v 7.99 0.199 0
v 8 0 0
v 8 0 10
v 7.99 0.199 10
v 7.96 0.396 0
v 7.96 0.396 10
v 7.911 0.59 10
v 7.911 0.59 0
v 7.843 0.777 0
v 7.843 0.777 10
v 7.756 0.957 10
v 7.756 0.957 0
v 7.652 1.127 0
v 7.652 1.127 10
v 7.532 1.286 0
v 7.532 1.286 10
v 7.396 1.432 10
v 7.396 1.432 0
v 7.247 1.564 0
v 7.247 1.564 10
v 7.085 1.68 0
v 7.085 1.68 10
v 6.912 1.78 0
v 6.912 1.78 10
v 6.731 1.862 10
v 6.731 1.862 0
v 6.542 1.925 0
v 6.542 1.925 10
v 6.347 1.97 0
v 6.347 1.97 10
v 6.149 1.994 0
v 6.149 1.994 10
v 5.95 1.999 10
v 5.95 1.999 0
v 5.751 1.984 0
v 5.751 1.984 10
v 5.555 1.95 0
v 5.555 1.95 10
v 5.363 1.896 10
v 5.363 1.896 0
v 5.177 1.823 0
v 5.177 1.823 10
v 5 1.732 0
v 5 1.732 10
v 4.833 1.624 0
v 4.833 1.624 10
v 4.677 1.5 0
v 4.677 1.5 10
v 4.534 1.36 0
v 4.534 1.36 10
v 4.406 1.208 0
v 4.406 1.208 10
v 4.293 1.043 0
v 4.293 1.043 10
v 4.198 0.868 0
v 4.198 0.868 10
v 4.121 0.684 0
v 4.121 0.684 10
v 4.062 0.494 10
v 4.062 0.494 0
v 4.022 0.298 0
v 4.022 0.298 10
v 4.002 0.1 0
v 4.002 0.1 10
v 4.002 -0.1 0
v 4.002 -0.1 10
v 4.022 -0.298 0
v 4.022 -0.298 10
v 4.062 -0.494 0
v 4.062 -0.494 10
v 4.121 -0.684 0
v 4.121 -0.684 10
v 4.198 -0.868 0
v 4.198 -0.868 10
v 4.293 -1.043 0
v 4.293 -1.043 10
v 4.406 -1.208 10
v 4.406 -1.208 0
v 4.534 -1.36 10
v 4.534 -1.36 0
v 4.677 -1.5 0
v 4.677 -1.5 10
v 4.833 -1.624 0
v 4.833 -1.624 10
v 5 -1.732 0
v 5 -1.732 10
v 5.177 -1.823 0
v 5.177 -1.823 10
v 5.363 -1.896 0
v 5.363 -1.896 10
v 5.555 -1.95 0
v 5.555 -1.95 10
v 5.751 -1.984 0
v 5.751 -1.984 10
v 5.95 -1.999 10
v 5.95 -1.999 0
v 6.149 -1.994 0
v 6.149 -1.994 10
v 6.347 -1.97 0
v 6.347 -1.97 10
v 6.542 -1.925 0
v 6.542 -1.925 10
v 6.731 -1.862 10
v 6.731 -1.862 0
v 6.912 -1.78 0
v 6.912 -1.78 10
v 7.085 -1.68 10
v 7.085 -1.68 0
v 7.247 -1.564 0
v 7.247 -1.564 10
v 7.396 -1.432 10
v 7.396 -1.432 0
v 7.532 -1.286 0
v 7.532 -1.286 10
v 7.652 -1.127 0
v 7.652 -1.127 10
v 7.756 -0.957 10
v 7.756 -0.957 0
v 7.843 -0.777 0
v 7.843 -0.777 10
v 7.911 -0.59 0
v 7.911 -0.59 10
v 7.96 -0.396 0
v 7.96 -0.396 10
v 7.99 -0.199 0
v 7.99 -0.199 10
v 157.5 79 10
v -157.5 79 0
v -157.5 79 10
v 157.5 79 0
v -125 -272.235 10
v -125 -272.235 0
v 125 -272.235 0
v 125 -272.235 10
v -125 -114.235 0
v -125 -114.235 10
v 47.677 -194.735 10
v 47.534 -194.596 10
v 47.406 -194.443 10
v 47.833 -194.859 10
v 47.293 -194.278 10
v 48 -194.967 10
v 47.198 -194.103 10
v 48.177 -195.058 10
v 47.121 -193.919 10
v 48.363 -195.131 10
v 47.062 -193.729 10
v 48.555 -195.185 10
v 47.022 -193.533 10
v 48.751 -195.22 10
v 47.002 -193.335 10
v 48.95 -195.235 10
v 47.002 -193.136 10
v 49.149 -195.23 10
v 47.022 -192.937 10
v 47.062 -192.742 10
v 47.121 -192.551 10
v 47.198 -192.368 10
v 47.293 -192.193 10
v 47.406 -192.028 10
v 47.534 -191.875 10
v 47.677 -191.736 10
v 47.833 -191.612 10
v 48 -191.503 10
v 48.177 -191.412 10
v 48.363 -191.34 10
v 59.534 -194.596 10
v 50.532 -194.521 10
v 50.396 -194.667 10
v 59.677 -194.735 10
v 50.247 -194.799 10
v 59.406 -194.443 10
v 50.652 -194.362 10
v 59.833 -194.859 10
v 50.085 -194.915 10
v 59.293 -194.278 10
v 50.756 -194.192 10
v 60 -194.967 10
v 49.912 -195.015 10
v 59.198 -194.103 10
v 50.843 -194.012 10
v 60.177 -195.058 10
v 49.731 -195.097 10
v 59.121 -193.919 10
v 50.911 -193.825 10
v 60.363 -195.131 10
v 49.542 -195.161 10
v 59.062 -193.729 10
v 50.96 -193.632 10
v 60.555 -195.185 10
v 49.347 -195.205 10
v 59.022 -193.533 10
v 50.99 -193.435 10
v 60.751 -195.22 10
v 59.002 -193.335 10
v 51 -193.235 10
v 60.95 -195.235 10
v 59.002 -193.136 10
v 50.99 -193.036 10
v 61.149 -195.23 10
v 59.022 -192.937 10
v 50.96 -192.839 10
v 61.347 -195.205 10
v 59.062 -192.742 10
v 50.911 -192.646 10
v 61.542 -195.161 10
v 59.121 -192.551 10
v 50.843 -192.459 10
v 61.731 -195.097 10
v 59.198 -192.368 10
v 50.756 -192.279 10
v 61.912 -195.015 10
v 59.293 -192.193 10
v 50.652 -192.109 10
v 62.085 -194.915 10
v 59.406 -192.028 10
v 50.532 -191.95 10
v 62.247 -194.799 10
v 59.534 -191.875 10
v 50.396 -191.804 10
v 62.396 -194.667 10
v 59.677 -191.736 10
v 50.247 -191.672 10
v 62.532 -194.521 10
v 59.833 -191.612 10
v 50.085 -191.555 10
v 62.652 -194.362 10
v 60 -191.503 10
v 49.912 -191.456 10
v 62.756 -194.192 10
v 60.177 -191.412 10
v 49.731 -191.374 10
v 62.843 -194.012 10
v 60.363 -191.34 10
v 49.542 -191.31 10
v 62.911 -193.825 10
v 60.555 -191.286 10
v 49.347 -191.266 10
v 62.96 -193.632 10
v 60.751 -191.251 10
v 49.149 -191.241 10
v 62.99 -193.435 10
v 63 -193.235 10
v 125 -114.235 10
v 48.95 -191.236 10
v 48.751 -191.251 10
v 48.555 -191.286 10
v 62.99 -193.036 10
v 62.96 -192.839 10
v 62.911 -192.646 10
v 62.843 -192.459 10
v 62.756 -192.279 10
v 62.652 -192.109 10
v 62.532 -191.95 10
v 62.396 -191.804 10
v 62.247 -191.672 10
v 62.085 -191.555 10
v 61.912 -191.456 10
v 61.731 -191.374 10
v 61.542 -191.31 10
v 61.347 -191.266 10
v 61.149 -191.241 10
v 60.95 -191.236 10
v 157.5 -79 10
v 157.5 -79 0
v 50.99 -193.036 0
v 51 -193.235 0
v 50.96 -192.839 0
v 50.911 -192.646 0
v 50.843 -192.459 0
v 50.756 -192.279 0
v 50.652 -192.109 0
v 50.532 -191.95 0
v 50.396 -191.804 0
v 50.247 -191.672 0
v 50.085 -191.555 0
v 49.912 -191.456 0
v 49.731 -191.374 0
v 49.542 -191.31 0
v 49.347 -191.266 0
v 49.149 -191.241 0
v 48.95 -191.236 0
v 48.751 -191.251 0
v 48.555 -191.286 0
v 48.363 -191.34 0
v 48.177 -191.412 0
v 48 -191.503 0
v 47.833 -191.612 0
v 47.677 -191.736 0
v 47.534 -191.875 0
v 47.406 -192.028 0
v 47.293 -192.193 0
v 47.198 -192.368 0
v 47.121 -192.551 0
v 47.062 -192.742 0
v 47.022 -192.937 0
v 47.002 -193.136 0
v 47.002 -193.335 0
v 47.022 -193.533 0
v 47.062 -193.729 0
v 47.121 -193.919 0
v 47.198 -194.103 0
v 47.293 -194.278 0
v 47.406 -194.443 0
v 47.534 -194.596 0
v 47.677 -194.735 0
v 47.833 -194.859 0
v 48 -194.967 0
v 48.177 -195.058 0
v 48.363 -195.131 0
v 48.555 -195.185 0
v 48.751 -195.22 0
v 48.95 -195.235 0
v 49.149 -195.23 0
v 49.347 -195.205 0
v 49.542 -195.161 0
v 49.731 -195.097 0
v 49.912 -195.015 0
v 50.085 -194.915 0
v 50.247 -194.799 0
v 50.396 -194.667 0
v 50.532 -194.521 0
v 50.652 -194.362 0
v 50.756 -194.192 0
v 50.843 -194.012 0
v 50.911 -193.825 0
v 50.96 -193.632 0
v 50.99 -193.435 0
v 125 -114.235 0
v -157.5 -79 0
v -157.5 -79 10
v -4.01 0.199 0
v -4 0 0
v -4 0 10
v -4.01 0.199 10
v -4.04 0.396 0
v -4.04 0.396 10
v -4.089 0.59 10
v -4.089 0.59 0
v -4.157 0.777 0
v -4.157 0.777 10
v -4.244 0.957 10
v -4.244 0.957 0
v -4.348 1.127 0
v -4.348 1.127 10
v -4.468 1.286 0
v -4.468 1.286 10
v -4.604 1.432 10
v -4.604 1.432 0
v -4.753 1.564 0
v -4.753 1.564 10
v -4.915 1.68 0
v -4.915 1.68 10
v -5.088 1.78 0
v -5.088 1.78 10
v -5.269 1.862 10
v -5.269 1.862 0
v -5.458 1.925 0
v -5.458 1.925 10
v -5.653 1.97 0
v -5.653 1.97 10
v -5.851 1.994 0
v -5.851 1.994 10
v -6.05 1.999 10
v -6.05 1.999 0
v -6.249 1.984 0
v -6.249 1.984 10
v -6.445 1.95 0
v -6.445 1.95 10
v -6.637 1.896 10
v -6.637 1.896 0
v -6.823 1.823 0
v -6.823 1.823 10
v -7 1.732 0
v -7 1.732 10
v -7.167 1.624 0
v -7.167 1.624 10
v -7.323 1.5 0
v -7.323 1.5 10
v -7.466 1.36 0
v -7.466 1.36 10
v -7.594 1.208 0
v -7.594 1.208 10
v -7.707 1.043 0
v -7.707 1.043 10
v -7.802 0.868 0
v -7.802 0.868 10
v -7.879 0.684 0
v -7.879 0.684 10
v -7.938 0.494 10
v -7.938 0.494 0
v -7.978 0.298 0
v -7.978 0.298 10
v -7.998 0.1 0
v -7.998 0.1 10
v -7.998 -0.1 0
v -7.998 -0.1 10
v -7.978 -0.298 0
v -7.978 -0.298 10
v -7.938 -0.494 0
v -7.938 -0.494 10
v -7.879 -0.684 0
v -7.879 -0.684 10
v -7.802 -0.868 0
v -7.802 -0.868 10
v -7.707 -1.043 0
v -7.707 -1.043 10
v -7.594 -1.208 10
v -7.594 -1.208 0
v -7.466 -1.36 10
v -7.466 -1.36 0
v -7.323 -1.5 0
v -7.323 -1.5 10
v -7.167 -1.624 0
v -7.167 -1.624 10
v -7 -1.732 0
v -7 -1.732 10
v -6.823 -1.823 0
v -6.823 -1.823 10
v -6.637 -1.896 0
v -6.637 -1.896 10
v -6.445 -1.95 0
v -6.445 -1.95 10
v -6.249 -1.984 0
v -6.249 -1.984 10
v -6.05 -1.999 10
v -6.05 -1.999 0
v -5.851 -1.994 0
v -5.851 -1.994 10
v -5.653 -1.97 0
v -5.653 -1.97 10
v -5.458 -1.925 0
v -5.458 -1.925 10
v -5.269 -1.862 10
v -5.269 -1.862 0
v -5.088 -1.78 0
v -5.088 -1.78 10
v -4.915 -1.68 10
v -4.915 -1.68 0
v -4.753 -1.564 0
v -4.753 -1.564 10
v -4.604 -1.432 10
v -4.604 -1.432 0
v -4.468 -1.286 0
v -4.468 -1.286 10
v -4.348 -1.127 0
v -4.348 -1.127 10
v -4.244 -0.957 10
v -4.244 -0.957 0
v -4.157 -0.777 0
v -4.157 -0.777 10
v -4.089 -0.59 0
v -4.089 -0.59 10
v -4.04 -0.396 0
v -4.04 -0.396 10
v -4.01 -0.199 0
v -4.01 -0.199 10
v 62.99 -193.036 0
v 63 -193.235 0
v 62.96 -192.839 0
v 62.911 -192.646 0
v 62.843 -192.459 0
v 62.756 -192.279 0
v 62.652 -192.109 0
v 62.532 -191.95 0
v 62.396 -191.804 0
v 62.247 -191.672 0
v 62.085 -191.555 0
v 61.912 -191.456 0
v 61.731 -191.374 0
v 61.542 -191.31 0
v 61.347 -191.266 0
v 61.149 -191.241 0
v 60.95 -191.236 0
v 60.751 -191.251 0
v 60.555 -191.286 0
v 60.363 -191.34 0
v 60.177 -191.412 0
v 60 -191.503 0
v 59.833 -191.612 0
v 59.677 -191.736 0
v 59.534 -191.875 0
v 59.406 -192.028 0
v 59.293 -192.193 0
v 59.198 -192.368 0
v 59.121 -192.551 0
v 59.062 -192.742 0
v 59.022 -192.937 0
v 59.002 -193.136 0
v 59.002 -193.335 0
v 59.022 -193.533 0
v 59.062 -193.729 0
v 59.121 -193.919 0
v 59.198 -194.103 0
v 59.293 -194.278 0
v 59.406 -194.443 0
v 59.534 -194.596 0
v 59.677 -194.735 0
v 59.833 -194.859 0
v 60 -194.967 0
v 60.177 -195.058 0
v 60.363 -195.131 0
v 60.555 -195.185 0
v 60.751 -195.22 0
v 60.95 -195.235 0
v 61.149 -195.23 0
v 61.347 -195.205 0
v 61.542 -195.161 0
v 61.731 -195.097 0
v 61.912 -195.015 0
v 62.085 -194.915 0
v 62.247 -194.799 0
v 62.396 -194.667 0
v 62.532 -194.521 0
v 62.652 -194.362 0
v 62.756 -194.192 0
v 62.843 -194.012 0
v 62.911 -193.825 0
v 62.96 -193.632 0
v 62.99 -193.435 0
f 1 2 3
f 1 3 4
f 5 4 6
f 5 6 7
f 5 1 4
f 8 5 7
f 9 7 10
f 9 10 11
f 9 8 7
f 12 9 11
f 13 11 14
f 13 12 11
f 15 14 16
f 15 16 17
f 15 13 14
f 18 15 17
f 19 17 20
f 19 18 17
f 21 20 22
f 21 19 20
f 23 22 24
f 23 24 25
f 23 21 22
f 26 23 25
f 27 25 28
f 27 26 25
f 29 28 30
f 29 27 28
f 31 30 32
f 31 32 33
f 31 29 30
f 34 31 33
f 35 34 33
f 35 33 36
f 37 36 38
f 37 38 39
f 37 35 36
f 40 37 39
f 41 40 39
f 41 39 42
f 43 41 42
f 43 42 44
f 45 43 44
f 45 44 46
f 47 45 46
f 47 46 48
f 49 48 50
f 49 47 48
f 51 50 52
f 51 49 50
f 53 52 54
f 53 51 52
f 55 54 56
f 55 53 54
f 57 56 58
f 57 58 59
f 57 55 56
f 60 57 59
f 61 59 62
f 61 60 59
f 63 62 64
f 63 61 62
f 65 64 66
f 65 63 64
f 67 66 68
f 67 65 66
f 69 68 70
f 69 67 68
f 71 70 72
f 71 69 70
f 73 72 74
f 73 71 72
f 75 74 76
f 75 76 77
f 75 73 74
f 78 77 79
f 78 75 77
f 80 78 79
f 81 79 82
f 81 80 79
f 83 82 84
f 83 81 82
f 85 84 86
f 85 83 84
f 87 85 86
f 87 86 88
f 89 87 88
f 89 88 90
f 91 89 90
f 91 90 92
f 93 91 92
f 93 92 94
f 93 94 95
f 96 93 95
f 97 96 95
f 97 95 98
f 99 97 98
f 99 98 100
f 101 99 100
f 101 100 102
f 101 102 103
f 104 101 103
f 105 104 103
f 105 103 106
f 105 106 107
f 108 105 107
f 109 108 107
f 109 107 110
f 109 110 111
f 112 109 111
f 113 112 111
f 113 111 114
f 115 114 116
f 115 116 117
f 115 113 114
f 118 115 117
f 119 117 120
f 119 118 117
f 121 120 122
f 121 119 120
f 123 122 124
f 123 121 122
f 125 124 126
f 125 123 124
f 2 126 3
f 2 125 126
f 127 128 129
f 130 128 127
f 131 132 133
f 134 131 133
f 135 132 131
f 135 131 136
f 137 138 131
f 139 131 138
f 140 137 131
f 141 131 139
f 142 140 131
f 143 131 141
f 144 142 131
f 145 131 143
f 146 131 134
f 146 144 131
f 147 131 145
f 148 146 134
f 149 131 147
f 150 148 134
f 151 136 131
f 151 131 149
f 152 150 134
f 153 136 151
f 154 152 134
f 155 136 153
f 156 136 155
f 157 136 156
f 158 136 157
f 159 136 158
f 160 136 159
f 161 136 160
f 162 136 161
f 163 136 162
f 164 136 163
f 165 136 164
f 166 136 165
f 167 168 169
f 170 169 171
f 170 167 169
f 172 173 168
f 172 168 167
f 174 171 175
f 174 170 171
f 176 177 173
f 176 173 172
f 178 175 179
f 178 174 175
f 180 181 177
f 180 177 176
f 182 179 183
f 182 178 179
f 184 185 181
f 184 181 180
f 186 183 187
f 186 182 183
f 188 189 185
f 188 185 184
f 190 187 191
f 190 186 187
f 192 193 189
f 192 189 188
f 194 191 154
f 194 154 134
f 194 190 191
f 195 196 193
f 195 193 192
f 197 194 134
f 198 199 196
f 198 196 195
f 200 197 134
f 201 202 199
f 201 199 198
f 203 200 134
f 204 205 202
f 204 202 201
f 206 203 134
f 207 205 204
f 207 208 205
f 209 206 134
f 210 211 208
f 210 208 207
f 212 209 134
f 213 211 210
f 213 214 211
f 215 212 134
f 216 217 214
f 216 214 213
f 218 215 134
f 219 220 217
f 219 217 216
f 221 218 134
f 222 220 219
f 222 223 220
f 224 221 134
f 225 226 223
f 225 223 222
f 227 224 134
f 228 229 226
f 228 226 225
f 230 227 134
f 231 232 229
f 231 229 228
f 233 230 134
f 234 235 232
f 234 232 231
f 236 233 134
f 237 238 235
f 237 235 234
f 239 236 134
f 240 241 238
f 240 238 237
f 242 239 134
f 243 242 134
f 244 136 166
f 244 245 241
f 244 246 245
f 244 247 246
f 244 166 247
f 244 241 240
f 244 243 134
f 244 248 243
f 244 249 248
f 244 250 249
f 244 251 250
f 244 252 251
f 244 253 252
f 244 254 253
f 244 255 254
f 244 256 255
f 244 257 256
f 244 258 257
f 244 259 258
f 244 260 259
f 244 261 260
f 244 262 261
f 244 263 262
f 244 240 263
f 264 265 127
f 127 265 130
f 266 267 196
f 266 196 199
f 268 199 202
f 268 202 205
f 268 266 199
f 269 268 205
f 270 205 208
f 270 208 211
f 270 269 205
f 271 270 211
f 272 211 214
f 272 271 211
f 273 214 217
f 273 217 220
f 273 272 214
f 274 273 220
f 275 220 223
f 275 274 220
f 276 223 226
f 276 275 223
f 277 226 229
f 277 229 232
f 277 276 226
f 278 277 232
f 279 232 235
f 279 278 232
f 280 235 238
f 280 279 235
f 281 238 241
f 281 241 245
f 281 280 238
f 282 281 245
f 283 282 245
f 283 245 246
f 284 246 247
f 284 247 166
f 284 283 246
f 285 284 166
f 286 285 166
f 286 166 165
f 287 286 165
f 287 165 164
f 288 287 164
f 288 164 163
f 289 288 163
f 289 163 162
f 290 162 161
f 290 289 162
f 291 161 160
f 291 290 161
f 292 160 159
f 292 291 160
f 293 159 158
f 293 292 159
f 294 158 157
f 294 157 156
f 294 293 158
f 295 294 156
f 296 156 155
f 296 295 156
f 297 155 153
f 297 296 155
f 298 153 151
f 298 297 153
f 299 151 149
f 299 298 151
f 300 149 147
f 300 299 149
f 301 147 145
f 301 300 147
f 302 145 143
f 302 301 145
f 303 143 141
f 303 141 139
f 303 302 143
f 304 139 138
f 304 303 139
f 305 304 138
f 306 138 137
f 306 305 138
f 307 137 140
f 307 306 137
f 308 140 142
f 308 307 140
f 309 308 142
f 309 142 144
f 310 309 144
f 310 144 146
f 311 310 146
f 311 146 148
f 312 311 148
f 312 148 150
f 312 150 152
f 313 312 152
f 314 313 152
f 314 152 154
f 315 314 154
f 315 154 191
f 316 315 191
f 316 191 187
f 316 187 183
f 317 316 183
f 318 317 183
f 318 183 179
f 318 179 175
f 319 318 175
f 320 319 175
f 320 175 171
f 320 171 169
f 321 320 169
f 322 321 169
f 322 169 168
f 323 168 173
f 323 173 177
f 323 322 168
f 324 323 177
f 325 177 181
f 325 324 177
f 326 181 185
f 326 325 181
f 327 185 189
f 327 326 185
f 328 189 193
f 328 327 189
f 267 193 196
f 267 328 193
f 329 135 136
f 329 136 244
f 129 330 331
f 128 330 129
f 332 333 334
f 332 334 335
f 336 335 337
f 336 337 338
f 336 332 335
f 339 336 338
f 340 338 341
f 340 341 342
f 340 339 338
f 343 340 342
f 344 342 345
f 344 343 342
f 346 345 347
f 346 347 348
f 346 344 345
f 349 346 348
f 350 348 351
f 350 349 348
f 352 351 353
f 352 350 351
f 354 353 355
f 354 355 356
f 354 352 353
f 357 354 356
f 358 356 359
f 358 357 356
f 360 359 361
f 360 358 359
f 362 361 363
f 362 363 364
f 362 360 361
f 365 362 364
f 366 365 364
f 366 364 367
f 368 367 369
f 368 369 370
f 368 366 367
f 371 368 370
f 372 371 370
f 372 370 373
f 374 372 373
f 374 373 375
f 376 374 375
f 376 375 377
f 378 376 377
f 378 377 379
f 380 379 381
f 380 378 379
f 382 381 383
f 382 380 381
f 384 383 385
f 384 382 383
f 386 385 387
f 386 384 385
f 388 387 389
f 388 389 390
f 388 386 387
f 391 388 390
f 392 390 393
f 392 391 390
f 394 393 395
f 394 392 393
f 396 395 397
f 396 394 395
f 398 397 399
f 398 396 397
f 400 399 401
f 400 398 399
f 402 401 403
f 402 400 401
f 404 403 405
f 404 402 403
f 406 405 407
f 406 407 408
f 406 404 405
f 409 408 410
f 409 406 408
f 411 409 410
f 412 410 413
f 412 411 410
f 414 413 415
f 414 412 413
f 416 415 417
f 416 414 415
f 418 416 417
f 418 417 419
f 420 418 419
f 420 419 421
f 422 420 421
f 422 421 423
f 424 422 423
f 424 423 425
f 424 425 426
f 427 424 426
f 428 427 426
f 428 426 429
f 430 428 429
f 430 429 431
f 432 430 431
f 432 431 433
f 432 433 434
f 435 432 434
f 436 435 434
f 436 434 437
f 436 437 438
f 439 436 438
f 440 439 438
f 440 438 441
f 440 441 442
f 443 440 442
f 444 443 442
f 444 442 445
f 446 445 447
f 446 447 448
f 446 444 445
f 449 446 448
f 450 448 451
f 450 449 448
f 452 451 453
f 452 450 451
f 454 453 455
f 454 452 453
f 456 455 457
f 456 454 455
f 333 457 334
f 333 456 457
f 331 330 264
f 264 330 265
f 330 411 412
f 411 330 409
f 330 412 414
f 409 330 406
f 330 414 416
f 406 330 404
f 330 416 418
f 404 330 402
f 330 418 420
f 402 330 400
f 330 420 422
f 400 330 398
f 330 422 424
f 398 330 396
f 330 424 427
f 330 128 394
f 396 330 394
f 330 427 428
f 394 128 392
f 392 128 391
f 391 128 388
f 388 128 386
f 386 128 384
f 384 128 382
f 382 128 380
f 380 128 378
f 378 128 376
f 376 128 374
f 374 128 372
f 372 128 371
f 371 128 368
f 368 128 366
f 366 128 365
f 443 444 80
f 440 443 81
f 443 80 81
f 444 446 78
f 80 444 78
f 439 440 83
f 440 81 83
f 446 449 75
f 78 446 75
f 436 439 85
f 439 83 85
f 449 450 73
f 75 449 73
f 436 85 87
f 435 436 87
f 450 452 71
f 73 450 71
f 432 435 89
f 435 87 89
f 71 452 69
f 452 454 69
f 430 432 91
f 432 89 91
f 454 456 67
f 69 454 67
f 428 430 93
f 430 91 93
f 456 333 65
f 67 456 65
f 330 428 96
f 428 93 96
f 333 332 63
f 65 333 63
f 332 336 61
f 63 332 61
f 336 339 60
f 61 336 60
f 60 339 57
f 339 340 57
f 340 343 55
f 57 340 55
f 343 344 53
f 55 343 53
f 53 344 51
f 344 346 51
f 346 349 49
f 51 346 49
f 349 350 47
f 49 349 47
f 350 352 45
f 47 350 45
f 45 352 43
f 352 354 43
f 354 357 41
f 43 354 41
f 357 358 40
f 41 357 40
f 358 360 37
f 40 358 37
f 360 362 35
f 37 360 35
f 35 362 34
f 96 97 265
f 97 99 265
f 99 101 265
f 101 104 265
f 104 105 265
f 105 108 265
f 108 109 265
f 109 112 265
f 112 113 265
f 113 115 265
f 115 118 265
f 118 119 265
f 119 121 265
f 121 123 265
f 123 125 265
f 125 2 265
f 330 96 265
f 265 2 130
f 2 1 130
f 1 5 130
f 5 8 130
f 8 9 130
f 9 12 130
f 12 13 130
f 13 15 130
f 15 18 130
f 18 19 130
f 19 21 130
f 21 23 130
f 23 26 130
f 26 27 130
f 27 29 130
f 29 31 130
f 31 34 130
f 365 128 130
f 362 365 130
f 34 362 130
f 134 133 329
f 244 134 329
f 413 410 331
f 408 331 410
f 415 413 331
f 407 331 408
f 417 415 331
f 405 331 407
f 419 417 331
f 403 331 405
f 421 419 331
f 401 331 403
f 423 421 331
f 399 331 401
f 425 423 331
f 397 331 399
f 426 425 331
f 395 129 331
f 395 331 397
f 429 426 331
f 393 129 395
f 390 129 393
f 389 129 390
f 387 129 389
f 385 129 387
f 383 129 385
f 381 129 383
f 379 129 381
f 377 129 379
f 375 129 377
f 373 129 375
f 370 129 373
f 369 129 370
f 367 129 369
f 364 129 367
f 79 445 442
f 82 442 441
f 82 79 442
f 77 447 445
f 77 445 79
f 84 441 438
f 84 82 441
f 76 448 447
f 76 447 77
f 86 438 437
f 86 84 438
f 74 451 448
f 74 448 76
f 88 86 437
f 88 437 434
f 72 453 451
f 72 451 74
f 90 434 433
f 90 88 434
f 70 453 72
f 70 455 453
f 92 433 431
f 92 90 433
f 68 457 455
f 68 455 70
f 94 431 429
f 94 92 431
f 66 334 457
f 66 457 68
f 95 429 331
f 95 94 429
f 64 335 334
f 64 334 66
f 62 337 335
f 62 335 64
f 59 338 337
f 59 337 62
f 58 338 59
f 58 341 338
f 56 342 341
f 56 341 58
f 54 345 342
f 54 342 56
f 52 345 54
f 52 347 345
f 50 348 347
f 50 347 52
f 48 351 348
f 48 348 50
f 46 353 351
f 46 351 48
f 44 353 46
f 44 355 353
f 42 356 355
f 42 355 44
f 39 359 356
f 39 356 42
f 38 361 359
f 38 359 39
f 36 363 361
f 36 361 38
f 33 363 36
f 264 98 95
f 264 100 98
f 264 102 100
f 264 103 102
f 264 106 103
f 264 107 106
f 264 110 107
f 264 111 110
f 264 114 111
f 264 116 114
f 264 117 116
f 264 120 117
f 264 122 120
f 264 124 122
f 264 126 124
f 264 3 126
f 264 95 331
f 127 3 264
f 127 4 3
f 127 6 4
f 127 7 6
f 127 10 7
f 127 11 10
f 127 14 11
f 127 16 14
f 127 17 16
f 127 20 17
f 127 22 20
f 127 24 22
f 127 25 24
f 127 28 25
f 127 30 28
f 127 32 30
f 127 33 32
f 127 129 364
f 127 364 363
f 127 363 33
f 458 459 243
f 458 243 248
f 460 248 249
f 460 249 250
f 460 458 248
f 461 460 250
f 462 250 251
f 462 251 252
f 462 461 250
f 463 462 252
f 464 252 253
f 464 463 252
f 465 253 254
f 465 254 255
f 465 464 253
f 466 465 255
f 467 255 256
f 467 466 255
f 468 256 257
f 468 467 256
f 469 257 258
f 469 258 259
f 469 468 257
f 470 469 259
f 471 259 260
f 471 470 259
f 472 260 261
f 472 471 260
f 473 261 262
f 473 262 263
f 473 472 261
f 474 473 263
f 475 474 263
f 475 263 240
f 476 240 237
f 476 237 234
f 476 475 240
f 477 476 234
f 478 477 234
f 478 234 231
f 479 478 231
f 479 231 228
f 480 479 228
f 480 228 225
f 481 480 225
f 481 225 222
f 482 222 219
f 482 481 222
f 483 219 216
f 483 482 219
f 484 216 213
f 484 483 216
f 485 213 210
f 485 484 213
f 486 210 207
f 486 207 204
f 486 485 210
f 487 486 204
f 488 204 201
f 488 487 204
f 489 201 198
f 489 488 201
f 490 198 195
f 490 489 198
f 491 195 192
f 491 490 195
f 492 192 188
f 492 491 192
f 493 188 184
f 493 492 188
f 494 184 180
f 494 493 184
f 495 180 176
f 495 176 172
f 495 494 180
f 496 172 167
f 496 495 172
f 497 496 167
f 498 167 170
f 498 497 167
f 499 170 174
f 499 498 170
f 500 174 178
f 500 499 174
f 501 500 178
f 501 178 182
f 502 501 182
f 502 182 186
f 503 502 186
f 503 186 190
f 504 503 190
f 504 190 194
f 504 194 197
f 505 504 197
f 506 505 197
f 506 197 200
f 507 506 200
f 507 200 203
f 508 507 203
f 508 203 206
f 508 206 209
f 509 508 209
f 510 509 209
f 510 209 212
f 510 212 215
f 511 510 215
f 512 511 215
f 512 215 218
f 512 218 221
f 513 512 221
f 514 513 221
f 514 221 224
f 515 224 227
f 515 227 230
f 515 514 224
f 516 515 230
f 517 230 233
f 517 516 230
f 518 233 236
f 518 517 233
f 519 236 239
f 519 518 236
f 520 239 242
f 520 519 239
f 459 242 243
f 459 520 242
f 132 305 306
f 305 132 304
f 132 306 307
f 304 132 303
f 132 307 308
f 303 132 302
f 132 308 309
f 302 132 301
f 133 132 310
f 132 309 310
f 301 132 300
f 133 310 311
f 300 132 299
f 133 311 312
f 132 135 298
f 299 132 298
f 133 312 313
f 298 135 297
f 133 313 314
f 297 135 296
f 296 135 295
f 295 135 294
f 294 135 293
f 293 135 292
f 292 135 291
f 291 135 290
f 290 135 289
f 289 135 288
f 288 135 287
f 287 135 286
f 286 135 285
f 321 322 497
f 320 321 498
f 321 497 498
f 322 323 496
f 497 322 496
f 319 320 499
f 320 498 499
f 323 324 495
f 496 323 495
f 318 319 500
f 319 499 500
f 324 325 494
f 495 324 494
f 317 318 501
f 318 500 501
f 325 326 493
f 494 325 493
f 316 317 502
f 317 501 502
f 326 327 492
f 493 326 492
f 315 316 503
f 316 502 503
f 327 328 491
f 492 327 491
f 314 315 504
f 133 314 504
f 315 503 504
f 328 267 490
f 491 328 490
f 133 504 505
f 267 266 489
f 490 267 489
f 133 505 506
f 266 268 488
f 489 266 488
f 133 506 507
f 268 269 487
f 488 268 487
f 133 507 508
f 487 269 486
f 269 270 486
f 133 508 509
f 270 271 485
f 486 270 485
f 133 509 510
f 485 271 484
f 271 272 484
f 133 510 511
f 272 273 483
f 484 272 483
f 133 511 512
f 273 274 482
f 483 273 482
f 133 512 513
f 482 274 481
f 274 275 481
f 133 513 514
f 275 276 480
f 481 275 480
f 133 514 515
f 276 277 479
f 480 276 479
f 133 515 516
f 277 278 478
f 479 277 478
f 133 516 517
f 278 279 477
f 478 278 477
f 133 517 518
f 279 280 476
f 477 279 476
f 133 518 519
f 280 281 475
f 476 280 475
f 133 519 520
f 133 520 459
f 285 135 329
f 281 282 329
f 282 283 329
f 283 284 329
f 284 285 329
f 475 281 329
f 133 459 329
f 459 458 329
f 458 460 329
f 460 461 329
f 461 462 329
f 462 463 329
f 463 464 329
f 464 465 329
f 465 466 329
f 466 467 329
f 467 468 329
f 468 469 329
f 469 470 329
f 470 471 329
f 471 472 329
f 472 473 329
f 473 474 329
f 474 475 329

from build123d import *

# Parameters (mm, degrees)
F0_W     = 315
F0_H     = 158
F0_R     = 2
F0_W_2   = 250
F1_DEPTH = 10


with BuildPart() as f1:
    # F0 (on Top) → F1 (new body)
    with BuildSketch(Plane.XY):
        Rectangle(F0_W, F0_H)
        with Locations((-6, 0)):
            Circle(F0_R, mode=Mode.SUBTRACT)
        with Locations((6, 0)):
            Circle(F0_R, mode=Mode.SUBTRACT)
        with Locations((0, -193.235412)):
            Rectangle(F0_W_2, F0_H)
        with Locations((49, -193.235412)):
            Circle(F0_R, mode=Mode.SUBTRACT)
        with Locations((61, -193.235412)):
            Circle(F0_R, mode=Mode.SUBTRACT)
    extrude(amount=F1_DEPTH)


solid = f1.part
